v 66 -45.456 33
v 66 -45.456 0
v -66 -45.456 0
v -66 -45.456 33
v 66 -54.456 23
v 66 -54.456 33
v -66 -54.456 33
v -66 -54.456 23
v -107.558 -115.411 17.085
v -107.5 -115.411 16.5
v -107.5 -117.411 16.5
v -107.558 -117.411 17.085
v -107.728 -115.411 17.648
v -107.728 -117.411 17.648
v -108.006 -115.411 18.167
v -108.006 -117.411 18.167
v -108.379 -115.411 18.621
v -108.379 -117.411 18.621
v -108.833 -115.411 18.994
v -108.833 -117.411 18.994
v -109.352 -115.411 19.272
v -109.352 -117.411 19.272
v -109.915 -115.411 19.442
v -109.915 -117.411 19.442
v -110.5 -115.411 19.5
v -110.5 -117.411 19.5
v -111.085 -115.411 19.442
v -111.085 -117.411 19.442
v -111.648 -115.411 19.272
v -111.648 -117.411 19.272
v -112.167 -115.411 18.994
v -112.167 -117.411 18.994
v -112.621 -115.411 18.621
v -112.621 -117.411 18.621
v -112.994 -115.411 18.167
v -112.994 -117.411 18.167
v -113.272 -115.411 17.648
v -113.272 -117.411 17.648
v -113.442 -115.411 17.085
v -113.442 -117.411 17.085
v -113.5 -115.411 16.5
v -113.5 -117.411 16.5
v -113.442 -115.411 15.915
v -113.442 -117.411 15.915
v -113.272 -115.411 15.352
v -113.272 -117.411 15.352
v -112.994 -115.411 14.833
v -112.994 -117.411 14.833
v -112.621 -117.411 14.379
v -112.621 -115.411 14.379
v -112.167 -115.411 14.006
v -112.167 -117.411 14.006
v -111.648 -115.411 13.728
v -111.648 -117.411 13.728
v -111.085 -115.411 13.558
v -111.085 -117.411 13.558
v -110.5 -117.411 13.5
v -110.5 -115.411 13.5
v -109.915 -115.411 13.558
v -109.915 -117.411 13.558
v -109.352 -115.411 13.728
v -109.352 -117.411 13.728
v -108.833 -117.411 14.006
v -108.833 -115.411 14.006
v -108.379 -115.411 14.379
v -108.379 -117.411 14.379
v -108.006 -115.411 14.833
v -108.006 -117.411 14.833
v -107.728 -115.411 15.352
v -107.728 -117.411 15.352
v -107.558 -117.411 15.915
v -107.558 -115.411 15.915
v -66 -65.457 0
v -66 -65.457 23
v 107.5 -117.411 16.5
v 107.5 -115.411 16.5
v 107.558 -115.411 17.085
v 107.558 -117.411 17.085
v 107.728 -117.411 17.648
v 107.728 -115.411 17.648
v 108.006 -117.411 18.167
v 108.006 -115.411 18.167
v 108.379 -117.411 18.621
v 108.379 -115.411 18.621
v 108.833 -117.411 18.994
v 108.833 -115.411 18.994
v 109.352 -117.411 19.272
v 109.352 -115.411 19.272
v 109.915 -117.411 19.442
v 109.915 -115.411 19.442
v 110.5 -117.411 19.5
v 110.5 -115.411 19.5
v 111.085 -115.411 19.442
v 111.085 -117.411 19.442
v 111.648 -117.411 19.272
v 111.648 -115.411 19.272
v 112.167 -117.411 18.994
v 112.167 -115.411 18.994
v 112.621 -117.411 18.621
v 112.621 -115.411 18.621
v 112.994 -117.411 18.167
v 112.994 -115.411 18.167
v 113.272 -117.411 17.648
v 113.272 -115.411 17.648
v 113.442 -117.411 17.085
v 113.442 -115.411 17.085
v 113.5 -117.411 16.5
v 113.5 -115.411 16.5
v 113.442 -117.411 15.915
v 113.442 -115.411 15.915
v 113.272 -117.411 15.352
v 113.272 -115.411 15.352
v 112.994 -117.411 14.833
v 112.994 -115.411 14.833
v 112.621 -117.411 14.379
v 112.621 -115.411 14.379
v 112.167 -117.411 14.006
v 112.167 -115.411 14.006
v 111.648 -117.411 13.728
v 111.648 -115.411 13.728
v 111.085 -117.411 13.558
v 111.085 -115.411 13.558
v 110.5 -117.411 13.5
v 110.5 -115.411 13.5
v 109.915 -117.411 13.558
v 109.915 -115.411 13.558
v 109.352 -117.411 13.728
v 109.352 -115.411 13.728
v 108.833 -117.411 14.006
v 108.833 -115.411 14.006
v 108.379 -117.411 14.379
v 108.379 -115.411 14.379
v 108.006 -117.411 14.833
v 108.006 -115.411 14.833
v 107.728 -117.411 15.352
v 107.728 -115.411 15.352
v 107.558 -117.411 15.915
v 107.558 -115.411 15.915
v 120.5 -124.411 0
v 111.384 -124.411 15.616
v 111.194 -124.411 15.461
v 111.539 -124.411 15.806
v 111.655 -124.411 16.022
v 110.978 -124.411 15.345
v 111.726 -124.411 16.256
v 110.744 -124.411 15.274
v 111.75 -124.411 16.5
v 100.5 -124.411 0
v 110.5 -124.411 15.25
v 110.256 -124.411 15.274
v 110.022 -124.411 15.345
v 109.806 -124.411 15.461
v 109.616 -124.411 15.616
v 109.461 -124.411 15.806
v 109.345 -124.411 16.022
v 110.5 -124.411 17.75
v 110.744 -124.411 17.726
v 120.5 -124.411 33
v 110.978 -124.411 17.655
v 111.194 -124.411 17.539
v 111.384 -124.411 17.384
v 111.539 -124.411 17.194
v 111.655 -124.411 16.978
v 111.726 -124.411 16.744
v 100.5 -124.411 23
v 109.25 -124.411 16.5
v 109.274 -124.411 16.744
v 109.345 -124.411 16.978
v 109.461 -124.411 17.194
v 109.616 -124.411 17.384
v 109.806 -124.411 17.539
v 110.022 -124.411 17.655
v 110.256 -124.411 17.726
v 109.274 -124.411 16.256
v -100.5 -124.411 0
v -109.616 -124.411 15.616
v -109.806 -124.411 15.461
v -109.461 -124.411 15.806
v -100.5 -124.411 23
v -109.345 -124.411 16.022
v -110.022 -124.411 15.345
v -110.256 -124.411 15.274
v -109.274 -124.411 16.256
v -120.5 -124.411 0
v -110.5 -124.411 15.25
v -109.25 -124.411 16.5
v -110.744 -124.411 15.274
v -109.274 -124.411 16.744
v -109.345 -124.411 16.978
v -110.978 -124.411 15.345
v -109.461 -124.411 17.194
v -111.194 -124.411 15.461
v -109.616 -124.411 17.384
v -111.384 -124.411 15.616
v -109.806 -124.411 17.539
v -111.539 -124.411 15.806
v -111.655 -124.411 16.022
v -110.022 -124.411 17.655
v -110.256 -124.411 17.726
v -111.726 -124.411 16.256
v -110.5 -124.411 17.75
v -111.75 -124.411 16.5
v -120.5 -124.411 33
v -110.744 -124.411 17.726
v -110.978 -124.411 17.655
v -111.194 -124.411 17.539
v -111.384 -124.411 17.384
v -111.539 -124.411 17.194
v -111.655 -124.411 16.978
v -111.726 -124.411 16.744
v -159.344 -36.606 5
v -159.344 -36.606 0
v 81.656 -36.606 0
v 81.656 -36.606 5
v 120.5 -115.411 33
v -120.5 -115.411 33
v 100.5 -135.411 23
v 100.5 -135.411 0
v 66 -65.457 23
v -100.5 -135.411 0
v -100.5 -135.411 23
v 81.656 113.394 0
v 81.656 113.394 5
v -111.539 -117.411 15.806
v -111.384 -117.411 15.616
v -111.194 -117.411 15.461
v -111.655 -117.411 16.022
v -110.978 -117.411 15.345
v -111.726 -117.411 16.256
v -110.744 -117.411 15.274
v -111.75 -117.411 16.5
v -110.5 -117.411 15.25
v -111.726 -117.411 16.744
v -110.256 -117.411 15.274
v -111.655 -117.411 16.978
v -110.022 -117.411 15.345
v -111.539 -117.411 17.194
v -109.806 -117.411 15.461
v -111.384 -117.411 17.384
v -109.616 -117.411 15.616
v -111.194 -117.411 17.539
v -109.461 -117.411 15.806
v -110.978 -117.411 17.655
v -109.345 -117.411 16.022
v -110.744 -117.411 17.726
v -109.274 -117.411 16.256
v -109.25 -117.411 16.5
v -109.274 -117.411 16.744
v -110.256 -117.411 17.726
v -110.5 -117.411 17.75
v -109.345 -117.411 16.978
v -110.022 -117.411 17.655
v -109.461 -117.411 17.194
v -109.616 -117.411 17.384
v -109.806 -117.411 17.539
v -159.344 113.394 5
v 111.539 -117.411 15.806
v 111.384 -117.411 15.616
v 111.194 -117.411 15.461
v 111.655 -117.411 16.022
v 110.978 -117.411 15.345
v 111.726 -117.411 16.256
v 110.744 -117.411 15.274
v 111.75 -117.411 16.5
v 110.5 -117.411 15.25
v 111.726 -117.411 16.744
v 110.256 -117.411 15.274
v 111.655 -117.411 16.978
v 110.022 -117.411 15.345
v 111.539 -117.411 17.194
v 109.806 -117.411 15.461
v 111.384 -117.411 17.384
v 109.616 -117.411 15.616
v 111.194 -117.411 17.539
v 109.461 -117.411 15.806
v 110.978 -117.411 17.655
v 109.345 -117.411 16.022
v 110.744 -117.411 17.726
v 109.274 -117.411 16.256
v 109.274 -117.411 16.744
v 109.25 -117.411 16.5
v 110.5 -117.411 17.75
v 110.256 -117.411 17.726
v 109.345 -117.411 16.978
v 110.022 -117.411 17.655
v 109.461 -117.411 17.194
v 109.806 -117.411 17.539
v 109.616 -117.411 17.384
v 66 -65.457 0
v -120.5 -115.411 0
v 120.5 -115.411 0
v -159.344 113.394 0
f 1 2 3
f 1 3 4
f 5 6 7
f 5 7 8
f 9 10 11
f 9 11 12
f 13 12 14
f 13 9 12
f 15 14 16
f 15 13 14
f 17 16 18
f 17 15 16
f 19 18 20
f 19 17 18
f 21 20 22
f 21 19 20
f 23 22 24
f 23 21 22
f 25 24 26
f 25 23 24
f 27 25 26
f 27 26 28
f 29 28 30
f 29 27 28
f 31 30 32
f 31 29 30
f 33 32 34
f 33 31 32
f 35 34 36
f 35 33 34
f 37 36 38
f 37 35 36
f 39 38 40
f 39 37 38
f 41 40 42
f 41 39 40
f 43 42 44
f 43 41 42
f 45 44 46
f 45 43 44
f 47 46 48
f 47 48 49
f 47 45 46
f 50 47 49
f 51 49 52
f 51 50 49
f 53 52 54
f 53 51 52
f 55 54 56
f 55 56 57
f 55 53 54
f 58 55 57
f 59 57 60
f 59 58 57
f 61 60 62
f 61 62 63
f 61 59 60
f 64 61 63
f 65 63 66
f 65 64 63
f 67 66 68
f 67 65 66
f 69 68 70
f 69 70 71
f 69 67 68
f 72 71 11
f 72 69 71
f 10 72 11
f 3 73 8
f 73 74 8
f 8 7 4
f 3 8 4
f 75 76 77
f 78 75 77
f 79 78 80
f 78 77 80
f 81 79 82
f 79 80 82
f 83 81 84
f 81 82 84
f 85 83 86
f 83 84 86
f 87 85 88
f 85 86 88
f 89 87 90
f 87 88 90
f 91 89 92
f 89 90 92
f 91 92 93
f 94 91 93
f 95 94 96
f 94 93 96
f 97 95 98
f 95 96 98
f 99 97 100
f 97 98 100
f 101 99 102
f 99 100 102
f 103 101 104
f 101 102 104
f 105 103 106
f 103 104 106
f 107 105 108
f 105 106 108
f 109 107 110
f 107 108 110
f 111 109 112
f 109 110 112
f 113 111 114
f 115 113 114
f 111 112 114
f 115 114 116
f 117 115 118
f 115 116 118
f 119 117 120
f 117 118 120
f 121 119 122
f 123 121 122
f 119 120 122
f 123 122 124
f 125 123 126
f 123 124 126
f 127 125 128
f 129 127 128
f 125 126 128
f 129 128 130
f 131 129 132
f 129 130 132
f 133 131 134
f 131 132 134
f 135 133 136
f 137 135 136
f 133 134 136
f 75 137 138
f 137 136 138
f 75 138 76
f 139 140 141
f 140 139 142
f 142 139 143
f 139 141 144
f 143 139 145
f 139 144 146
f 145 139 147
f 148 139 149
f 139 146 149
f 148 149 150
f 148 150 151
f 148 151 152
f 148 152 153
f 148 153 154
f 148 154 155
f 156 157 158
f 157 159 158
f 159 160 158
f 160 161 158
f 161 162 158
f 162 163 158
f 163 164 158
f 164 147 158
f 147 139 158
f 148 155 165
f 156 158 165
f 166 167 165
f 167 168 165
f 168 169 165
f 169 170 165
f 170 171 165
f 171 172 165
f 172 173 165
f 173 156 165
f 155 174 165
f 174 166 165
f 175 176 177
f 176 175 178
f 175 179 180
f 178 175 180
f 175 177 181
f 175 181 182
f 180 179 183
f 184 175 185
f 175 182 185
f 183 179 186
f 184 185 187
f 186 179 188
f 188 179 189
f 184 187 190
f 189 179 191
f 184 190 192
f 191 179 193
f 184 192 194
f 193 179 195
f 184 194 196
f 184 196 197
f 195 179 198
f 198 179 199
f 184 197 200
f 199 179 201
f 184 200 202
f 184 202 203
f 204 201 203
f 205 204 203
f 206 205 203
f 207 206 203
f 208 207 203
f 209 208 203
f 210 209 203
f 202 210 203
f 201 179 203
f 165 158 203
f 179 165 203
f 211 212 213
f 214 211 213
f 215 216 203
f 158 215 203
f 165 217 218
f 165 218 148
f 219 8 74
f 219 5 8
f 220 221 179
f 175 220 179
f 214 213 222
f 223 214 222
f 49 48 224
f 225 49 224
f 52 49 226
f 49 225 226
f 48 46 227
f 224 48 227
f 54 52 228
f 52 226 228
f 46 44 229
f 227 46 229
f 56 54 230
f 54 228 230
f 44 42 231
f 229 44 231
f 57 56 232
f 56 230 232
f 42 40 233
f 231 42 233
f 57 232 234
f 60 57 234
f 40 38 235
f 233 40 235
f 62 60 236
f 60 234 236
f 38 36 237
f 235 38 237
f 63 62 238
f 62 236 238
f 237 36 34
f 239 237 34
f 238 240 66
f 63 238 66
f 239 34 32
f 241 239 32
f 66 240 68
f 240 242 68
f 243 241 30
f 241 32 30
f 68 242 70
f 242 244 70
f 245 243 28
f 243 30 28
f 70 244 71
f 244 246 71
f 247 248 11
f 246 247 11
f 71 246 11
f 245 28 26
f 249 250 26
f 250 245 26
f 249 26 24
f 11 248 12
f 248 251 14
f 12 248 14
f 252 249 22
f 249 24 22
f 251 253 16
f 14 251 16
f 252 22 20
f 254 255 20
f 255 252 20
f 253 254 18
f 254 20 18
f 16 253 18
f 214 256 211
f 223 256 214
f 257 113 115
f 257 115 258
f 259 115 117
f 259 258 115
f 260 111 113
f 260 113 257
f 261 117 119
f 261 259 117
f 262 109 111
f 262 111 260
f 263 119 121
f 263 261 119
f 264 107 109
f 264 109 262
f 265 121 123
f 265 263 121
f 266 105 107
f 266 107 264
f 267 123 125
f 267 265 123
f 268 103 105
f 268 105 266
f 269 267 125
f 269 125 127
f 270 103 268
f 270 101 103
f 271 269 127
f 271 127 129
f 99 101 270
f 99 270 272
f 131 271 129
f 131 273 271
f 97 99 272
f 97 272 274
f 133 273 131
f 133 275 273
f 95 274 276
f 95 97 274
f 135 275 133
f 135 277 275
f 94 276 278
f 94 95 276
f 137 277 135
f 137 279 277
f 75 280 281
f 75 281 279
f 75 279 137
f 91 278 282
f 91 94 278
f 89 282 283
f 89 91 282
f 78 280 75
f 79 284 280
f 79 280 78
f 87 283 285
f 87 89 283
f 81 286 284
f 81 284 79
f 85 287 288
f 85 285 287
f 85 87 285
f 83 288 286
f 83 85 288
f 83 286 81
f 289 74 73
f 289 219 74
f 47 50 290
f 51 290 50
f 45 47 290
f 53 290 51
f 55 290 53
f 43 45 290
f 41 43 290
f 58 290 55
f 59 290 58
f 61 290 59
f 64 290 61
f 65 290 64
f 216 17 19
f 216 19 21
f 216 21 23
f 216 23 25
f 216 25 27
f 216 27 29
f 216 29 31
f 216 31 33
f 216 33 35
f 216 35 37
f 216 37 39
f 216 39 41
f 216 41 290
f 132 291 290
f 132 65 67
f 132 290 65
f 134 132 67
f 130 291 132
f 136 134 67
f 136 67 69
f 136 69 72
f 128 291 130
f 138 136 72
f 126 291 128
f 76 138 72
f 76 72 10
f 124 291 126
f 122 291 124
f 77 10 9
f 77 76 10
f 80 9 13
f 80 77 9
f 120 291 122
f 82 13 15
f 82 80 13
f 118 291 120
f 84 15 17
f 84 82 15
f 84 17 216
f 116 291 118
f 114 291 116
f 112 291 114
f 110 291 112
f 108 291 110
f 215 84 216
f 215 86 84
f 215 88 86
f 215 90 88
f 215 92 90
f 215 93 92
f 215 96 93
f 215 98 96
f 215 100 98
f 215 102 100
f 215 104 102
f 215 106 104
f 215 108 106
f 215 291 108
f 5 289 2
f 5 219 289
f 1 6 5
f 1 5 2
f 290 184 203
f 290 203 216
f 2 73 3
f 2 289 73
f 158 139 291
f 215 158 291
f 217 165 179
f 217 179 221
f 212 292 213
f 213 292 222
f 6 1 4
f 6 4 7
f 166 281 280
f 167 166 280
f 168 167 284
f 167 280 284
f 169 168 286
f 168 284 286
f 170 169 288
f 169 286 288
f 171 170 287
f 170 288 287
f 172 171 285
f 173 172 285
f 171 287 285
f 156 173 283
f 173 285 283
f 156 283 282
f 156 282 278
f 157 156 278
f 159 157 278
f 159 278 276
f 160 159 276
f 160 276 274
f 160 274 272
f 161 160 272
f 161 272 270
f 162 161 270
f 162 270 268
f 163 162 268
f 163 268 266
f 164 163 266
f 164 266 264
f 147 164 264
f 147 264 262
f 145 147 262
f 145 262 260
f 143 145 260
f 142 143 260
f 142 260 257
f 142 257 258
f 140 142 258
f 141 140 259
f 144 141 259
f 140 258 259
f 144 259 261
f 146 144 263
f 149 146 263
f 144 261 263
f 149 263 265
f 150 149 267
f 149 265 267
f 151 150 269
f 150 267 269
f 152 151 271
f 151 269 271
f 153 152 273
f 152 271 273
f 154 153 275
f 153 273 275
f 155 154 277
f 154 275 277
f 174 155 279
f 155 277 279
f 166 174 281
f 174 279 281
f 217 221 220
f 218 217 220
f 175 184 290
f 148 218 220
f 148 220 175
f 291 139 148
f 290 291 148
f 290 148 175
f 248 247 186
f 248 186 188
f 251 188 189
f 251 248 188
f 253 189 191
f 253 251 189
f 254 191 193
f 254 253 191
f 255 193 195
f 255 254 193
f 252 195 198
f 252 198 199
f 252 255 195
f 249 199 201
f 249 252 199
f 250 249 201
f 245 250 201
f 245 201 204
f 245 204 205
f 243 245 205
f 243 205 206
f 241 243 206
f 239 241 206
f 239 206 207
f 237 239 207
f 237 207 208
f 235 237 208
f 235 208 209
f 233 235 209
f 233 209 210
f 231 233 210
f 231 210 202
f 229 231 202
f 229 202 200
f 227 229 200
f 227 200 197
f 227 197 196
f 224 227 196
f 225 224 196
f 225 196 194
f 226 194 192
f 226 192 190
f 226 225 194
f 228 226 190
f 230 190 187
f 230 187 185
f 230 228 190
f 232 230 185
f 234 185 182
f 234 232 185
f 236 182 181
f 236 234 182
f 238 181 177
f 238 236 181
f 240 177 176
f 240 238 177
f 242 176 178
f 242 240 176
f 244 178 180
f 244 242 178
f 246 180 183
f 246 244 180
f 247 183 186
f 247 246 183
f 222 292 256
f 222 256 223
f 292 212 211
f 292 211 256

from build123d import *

# Parameters (mm, degrees)
F0_W      = 241
F0_H      = 150
F1_DEPTH  = 5
F3_DEPTH  = 120.5
F4_W      = 20
F4_H      = 11
F5_DEPTH  = 23.001
F7_DEPTH  = 66
F9_R      = 3
F10_DEPTH = 2
F11_R     = 1.25
F12_DEPTH = 18.001


with BuildPart() as f1:
    # F0 (on Top) → F1 (new body)
    with BuildSketch(Plane.XY):
        with Locations((-38.844081, 38.393882)):
            Rectangle(F0_W, F0_H)
    extrude(amount=F1_DEPTH)


with BuildPart() as f3:
    # F2 (on Right) → F3 (new body)
    with BuildSketch(Plane.YZ):
        Polygon((-135.410857, 0), (-115.410857, 0), (-115.410857, 33), (-124.410857, 33), (-124.410857, 23), (-135.410857, 23), align=None)
    extrude(amount=F3_DEPTH)

    # F4 (on face) → F5 (cut, through all)
    with BuildSketch(Plane.XY.offset(23)):
        with Locations((110.5, -129.910857)):
            Rectangle(F4_W, F4_H)
    extrude(amount=-F5_DEPTH, mode=Mode.SUBTRACT)

    # F9 (on face) → F10 (cut)
    with BuildSketch(Plane(origin=(0, -115.410857, 0), x_dir=(-1, 0, 0), z_dir=(0, 1, 0))):
        with Locations((-110.5, 16.5)):
            Circle(F9_R)
    extrude(amount=-F10_DEPTH, mode=Mode.SUBTRACT)

    # F11 (on face) → F12 (cut, through all)
    with BuildSketch(Plane(origin=(0, -117.410857, 0), x_dir=(-1, 0, 0), z_dir=(0, 1, 0))):
        with Locations((-110.5, 16.5)):
            Circle(F11_R)
    extrude(amount=-F12_DEPTH, mode=Mode.SUBTRACT)

    # F13: F3 across plane


with BuildPart() as f7:
    # F6 (on Right) → F7 (new body)
    with BuildSketch(Plane.YZ):
        Polygon((-65.4565, 0), (-45.4565, 0), (-45.4565, 33), (-54.4565, 33), (-54.4565, 23), (-65.4565, 23), align=None)
    extrude(amount=F7_DEPTH)

    # F8: F7 across plane


with BuildPart() as f7_1:
    add(f7.part)
    add(f7.part.mirror(Plane.YZ))


with BuildPart() as f3_1:
    add(f3.part)
    add(f3.part.mirror(Plane.YZ))


solid = Compound([f1.part, f7_1.part, f3_1.part])
